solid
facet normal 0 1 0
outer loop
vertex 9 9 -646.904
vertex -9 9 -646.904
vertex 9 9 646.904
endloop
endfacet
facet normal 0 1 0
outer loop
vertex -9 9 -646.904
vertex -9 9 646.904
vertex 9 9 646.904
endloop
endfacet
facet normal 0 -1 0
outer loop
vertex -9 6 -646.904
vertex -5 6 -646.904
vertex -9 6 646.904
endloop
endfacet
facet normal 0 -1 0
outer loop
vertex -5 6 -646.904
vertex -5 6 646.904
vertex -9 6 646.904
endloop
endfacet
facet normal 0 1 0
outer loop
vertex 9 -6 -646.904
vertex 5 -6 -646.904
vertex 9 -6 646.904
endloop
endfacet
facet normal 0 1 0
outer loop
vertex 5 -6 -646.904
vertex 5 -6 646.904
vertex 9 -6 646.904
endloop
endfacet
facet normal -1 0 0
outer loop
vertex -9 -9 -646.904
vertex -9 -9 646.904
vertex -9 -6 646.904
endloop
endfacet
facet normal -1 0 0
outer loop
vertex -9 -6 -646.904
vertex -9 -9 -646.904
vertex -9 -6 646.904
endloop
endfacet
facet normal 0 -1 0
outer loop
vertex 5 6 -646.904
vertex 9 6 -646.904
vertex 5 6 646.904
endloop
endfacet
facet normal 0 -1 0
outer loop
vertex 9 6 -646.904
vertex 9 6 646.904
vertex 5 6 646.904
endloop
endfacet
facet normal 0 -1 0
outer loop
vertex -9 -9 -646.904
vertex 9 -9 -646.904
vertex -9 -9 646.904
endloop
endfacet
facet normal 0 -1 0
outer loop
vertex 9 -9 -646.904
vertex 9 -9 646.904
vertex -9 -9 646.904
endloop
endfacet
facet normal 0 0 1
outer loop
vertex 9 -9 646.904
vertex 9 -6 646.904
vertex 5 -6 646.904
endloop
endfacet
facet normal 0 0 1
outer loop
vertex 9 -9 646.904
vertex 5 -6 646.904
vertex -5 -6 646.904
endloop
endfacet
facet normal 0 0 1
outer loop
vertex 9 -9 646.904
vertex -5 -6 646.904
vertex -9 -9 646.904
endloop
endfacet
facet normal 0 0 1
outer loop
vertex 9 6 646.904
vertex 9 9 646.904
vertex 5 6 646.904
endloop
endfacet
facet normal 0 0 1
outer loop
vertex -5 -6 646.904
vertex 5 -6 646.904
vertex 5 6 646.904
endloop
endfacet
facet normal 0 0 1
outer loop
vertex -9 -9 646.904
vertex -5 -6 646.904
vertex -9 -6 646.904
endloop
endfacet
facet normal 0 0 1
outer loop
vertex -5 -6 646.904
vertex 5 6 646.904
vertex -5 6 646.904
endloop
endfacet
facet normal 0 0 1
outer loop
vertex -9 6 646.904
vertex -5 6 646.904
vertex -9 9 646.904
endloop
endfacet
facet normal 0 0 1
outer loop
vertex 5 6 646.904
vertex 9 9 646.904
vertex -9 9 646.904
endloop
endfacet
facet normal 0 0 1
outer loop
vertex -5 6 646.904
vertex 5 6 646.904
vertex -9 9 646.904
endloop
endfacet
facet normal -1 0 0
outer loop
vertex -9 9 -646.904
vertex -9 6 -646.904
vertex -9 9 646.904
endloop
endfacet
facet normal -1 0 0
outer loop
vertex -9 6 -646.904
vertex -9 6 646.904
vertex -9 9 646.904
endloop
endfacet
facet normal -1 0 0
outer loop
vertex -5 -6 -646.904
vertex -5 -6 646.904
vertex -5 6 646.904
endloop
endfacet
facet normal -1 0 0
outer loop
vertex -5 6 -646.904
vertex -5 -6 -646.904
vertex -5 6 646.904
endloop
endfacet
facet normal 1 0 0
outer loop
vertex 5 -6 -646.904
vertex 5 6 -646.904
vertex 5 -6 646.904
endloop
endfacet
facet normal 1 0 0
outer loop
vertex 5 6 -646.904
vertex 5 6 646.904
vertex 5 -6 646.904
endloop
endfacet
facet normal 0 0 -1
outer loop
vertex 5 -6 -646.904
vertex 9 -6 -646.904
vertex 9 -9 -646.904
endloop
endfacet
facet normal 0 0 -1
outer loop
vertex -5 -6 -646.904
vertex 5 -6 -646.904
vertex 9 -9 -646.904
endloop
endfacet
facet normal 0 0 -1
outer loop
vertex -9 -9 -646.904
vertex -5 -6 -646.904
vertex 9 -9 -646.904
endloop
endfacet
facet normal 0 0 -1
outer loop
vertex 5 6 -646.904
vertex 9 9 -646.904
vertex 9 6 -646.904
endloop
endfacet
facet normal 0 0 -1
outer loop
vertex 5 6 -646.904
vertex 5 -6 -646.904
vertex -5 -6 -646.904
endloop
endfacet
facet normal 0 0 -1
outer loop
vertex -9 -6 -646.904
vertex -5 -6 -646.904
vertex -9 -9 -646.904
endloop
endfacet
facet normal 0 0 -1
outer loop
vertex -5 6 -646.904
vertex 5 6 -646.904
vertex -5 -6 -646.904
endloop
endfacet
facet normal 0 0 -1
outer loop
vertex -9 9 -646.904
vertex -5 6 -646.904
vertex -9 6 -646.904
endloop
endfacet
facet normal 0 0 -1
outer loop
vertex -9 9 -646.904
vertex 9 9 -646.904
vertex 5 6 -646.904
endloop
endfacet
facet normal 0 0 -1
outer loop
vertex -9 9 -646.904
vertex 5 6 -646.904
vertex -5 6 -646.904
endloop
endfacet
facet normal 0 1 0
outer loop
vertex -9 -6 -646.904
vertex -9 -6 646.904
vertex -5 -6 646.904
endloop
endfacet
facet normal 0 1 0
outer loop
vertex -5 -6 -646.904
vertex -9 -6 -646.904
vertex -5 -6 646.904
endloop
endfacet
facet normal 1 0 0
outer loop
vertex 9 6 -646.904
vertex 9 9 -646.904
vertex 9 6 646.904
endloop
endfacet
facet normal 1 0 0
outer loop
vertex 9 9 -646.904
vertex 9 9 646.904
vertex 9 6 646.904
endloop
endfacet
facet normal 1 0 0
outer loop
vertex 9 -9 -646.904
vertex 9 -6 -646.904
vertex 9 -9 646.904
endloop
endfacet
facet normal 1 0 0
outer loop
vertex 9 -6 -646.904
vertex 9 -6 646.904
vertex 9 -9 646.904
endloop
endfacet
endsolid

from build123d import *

# Parameters (mm, degrees)
BOSS_EXTRUDE1_DEPTH = 646.904


with BuildPart() as part:
    # Sketch1 → Boss-Extrude1 (new body)
    with BuildSketch(Plane.XY):
        Polygon((-5, -6), (-5, 6), (-9, 6), (-9, 9), (9, 9), (9, 6), (5, 6), (5, -6), (9, -6), (9, -9), (-9, -9), (-9, -6), align=None)
    extrude(amount=BOSS_EXTRUDE1_DEPTH)

    # Mirror1: part across plane


with BuildPart() as part_1:
    add(part.part)
    add(part.part.mirror(Plane(origin=(0, 0, 0), x_dir=(1, 0, 0), z_dir=(0, 0, -1))))


solid = part_1.part
